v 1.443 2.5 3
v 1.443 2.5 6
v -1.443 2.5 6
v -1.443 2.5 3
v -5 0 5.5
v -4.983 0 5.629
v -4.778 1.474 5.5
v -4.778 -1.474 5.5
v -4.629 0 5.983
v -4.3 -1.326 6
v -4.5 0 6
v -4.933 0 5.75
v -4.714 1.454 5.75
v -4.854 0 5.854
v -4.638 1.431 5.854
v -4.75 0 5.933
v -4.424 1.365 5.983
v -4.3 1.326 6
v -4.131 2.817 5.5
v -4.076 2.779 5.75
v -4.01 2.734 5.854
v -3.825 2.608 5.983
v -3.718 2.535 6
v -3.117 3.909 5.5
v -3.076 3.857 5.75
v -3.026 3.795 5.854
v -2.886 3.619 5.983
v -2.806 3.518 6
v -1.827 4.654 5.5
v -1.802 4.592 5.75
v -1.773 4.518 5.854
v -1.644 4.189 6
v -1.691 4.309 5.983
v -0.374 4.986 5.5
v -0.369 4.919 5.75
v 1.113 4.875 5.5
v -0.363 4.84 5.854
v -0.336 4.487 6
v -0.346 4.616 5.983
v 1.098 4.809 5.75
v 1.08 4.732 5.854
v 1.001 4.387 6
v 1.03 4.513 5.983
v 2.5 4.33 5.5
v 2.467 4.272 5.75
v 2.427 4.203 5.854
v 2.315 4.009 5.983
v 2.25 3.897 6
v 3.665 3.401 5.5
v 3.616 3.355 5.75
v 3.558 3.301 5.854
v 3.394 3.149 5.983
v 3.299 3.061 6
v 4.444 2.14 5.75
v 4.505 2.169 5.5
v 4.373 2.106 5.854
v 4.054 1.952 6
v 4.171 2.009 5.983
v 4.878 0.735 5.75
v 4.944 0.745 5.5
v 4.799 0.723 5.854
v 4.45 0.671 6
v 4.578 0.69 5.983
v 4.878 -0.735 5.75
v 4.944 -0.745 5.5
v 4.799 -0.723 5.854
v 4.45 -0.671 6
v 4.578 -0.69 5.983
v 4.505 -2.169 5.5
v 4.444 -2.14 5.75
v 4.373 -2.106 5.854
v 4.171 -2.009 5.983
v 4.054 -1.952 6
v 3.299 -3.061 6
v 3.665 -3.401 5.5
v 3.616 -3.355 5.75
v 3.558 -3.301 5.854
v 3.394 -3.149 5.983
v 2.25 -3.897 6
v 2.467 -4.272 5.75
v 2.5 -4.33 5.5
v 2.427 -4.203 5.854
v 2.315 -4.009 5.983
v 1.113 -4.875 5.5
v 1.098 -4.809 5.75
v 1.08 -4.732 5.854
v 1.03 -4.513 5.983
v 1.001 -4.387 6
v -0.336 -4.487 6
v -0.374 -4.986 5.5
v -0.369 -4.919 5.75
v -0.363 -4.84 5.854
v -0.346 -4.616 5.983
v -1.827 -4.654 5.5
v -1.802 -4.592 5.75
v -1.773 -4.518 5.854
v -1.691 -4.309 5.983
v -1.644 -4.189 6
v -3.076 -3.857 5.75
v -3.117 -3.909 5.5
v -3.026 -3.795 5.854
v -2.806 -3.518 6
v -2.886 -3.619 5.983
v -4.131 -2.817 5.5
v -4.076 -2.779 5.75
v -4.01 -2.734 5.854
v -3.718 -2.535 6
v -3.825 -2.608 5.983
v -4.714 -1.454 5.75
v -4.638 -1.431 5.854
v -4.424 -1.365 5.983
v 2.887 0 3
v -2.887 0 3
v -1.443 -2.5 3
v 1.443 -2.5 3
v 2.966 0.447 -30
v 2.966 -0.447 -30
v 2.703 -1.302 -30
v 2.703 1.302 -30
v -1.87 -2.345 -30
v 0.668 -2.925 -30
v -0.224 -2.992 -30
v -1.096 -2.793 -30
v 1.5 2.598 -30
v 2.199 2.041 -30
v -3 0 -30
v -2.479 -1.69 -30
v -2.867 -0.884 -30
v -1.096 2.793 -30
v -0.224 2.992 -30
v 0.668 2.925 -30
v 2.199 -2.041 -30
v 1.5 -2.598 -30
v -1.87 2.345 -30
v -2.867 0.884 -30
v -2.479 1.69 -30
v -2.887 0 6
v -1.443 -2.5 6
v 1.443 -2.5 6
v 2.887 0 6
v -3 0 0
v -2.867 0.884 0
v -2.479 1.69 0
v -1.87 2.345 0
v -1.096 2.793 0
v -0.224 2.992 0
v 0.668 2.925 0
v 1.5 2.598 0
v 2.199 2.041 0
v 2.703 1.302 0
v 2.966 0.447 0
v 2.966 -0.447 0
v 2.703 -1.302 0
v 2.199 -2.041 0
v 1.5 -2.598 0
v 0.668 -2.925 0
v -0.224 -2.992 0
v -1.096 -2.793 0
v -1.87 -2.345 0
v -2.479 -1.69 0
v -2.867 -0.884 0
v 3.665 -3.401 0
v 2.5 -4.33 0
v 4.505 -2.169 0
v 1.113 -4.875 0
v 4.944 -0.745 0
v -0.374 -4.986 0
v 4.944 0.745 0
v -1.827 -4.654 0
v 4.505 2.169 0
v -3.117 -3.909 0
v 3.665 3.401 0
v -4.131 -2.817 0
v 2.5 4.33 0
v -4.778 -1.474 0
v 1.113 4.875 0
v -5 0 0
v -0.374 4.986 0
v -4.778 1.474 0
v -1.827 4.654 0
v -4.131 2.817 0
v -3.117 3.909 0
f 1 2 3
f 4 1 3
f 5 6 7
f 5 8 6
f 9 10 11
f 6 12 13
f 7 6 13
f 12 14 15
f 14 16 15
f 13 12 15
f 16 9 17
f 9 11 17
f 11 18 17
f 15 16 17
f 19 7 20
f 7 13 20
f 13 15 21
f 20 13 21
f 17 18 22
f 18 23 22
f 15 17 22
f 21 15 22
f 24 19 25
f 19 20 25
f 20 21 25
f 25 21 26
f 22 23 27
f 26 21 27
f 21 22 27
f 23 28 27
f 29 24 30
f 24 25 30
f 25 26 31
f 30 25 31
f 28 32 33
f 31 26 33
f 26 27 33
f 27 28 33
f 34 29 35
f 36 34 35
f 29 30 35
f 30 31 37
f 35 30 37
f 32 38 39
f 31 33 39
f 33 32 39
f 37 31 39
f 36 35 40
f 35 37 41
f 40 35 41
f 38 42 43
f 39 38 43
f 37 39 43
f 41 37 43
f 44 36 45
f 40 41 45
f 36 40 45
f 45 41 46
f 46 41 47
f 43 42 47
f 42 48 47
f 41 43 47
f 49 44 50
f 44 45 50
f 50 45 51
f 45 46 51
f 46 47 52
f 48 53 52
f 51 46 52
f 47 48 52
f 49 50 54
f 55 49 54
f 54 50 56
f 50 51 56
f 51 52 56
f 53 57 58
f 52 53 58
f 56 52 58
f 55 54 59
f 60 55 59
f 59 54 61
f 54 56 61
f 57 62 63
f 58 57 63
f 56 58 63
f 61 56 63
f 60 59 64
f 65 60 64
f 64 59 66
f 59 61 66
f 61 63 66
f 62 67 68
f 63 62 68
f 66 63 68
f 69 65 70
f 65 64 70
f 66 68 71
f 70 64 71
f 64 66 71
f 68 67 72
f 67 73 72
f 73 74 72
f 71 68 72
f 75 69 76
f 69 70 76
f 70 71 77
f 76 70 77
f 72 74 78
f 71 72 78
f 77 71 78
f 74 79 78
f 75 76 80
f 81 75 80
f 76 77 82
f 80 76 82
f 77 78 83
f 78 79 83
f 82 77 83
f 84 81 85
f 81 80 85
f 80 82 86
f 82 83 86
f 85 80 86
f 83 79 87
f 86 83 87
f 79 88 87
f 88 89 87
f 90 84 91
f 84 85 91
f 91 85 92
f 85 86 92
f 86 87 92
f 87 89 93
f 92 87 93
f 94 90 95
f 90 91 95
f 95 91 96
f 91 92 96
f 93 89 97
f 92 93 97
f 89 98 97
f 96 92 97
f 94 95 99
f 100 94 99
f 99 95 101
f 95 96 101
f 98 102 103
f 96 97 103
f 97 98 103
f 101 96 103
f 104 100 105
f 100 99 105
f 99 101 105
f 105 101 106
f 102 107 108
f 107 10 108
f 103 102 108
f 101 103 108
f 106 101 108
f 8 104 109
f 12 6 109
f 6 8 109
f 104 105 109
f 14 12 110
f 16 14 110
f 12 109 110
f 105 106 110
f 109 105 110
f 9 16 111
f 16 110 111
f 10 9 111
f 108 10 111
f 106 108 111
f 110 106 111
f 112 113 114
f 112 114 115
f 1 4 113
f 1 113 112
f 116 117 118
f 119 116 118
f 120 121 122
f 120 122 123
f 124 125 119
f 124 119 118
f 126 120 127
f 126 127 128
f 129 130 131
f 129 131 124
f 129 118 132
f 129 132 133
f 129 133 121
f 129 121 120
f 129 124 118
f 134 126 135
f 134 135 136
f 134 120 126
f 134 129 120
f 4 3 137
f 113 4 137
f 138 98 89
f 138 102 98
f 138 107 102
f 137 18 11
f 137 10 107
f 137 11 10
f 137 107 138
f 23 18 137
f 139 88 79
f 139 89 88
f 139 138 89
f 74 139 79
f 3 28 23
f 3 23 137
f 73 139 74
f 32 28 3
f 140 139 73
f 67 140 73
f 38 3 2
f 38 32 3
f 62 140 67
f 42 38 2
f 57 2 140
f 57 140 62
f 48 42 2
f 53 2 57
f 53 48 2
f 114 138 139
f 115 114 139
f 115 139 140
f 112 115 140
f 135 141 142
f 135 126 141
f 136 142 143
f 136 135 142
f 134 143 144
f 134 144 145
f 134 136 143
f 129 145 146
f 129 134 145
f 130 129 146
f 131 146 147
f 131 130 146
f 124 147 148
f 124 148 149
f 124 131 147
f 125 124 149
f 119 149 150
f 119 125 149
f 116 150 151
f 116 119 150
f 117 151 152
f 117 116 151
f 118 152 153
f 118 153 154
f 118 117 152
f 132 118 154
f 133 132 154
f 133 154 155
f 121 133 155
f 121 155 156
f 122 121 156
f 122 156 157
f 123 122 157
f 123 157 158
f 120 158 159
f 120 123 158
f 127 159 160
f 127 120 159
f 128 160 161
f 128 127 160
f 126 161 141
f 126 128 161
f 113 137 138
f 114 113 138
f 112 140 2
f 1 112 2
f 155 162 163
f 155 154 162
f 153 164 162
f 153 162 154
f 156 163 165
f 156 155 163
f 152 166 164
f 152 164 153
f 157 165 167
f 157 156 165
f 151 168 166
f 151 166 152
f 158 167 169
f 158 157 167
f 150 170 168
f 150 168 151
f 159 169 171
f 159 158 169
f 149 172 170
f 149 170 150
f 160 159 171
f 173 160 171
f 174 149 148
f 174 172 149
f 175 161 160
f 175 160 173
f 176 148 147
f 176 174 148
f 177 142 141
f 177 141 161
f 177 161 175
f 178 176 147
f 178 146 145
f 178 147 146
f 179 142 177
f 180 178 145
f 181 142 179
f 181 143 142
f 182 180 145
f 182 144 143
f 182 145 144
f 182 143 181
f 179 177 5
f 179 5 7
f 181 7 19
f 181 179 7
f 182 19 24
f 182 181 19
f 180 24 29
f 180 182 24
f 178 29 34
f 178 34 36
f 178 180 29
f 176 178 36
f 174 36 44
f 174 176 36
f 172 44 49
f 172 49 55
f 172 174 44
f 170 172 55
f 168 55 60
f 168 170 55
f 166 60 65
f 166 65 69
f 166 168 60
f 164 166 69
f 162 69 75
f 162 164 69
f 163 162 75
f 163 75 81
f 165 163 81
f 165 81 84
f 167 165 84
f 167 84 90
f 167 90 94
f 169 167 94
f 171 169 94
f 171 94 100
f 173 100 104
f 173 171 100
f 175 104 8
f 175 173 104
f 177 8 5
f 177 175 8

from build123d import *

# Parameters (mm, degrees)
F3_DEPTH = 3
F4_R     = 0.5


with BuildPart() as f1:
    # F0 (on Front) → F1 (revolve)
    with BuildSketch(Plane.XZ):
        Polygon((-3, -30), (0, -30), (0, 6), (-5, 6), (-5, 0), (-3, 0), align=None)
    revolve(axis=Axis((0, 0, -12), (0, 0, -1)))

    # F2 (on face) → F3 (cut)
    with BuildSketch(Plane.XY.offset(6)):
        Polygon((1.443376, 2.5), (-1.443376, 2.5), (-2.886751, 0), (-1.443376, -2.5), (1.443376, -2.5), (2.886751, 0), align=None)
    extrude(amount=-F3_DEPTH, mode=Mode.SUBTRACT)

    # F4
    f4_edges = [f1.edges().sort_by_distance(p)[0] for p in [
        (5, 0, 6),
    ]]
    fillet(f4_edges, radius=F4_R)


solid = f1.part
